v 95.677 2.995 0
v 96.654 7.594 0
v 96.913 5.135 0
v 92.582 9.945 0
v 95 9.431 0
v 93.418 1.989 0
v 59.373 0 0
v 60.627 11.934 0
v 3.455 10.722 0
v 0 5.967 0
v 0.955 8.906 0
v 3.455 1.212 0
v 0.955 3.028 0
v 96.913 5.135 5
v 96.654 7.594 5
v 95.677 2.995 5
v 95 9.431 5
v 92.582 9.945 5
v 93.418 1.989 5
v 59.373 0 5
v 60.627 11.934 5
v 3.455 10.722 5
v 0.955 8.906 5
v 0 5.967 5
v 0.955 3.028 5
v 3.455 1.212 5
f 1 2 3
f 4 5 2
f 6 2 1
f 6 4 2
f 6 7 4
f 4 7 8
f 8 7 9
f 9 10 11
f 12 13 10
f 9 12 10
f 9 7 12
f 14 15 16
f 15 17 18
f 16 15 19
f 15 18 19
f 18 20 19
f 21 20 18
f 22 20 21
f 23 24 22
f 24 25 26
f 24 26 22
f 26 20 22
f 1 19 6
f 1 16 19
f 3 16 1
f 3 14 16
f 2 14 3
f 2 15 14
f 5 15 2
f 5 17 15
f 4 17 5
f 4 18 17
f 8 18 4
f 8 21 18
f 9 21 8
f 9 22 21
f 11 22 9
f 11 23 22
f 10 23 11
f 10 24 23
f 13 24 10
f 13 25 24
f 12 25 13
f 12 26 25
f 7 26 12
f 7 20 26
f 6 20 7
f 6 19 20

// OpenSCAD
$fn = 32;

// ----------------------------------------------------------------------
// Lever arm: two bosses 10 and 12 mm, 55 mm between centres
// ----------------------------------------------------------------------

// --- parameters (mm) ---
profile_height = 5;       // extrusion height
profile_points = 13;      // points of the closed outline

profile = [[0, 5.967], [0.955, 3.028], [3.455, 1.212], [59.373, 0], [93.418, 1.989], [95.677, 2.995], [96.913, 5.135], [96.654, 7.594], [95, 9.431], [92.582, 9.945], [60.627, 11.934], [3.455, 10.722], [0.955, 8.906]];  // single closed polygon, 13 points, counter clockwise

// --- the one profile operation ---
linear_extrude(height = profile_height) polygon(points = profile);
